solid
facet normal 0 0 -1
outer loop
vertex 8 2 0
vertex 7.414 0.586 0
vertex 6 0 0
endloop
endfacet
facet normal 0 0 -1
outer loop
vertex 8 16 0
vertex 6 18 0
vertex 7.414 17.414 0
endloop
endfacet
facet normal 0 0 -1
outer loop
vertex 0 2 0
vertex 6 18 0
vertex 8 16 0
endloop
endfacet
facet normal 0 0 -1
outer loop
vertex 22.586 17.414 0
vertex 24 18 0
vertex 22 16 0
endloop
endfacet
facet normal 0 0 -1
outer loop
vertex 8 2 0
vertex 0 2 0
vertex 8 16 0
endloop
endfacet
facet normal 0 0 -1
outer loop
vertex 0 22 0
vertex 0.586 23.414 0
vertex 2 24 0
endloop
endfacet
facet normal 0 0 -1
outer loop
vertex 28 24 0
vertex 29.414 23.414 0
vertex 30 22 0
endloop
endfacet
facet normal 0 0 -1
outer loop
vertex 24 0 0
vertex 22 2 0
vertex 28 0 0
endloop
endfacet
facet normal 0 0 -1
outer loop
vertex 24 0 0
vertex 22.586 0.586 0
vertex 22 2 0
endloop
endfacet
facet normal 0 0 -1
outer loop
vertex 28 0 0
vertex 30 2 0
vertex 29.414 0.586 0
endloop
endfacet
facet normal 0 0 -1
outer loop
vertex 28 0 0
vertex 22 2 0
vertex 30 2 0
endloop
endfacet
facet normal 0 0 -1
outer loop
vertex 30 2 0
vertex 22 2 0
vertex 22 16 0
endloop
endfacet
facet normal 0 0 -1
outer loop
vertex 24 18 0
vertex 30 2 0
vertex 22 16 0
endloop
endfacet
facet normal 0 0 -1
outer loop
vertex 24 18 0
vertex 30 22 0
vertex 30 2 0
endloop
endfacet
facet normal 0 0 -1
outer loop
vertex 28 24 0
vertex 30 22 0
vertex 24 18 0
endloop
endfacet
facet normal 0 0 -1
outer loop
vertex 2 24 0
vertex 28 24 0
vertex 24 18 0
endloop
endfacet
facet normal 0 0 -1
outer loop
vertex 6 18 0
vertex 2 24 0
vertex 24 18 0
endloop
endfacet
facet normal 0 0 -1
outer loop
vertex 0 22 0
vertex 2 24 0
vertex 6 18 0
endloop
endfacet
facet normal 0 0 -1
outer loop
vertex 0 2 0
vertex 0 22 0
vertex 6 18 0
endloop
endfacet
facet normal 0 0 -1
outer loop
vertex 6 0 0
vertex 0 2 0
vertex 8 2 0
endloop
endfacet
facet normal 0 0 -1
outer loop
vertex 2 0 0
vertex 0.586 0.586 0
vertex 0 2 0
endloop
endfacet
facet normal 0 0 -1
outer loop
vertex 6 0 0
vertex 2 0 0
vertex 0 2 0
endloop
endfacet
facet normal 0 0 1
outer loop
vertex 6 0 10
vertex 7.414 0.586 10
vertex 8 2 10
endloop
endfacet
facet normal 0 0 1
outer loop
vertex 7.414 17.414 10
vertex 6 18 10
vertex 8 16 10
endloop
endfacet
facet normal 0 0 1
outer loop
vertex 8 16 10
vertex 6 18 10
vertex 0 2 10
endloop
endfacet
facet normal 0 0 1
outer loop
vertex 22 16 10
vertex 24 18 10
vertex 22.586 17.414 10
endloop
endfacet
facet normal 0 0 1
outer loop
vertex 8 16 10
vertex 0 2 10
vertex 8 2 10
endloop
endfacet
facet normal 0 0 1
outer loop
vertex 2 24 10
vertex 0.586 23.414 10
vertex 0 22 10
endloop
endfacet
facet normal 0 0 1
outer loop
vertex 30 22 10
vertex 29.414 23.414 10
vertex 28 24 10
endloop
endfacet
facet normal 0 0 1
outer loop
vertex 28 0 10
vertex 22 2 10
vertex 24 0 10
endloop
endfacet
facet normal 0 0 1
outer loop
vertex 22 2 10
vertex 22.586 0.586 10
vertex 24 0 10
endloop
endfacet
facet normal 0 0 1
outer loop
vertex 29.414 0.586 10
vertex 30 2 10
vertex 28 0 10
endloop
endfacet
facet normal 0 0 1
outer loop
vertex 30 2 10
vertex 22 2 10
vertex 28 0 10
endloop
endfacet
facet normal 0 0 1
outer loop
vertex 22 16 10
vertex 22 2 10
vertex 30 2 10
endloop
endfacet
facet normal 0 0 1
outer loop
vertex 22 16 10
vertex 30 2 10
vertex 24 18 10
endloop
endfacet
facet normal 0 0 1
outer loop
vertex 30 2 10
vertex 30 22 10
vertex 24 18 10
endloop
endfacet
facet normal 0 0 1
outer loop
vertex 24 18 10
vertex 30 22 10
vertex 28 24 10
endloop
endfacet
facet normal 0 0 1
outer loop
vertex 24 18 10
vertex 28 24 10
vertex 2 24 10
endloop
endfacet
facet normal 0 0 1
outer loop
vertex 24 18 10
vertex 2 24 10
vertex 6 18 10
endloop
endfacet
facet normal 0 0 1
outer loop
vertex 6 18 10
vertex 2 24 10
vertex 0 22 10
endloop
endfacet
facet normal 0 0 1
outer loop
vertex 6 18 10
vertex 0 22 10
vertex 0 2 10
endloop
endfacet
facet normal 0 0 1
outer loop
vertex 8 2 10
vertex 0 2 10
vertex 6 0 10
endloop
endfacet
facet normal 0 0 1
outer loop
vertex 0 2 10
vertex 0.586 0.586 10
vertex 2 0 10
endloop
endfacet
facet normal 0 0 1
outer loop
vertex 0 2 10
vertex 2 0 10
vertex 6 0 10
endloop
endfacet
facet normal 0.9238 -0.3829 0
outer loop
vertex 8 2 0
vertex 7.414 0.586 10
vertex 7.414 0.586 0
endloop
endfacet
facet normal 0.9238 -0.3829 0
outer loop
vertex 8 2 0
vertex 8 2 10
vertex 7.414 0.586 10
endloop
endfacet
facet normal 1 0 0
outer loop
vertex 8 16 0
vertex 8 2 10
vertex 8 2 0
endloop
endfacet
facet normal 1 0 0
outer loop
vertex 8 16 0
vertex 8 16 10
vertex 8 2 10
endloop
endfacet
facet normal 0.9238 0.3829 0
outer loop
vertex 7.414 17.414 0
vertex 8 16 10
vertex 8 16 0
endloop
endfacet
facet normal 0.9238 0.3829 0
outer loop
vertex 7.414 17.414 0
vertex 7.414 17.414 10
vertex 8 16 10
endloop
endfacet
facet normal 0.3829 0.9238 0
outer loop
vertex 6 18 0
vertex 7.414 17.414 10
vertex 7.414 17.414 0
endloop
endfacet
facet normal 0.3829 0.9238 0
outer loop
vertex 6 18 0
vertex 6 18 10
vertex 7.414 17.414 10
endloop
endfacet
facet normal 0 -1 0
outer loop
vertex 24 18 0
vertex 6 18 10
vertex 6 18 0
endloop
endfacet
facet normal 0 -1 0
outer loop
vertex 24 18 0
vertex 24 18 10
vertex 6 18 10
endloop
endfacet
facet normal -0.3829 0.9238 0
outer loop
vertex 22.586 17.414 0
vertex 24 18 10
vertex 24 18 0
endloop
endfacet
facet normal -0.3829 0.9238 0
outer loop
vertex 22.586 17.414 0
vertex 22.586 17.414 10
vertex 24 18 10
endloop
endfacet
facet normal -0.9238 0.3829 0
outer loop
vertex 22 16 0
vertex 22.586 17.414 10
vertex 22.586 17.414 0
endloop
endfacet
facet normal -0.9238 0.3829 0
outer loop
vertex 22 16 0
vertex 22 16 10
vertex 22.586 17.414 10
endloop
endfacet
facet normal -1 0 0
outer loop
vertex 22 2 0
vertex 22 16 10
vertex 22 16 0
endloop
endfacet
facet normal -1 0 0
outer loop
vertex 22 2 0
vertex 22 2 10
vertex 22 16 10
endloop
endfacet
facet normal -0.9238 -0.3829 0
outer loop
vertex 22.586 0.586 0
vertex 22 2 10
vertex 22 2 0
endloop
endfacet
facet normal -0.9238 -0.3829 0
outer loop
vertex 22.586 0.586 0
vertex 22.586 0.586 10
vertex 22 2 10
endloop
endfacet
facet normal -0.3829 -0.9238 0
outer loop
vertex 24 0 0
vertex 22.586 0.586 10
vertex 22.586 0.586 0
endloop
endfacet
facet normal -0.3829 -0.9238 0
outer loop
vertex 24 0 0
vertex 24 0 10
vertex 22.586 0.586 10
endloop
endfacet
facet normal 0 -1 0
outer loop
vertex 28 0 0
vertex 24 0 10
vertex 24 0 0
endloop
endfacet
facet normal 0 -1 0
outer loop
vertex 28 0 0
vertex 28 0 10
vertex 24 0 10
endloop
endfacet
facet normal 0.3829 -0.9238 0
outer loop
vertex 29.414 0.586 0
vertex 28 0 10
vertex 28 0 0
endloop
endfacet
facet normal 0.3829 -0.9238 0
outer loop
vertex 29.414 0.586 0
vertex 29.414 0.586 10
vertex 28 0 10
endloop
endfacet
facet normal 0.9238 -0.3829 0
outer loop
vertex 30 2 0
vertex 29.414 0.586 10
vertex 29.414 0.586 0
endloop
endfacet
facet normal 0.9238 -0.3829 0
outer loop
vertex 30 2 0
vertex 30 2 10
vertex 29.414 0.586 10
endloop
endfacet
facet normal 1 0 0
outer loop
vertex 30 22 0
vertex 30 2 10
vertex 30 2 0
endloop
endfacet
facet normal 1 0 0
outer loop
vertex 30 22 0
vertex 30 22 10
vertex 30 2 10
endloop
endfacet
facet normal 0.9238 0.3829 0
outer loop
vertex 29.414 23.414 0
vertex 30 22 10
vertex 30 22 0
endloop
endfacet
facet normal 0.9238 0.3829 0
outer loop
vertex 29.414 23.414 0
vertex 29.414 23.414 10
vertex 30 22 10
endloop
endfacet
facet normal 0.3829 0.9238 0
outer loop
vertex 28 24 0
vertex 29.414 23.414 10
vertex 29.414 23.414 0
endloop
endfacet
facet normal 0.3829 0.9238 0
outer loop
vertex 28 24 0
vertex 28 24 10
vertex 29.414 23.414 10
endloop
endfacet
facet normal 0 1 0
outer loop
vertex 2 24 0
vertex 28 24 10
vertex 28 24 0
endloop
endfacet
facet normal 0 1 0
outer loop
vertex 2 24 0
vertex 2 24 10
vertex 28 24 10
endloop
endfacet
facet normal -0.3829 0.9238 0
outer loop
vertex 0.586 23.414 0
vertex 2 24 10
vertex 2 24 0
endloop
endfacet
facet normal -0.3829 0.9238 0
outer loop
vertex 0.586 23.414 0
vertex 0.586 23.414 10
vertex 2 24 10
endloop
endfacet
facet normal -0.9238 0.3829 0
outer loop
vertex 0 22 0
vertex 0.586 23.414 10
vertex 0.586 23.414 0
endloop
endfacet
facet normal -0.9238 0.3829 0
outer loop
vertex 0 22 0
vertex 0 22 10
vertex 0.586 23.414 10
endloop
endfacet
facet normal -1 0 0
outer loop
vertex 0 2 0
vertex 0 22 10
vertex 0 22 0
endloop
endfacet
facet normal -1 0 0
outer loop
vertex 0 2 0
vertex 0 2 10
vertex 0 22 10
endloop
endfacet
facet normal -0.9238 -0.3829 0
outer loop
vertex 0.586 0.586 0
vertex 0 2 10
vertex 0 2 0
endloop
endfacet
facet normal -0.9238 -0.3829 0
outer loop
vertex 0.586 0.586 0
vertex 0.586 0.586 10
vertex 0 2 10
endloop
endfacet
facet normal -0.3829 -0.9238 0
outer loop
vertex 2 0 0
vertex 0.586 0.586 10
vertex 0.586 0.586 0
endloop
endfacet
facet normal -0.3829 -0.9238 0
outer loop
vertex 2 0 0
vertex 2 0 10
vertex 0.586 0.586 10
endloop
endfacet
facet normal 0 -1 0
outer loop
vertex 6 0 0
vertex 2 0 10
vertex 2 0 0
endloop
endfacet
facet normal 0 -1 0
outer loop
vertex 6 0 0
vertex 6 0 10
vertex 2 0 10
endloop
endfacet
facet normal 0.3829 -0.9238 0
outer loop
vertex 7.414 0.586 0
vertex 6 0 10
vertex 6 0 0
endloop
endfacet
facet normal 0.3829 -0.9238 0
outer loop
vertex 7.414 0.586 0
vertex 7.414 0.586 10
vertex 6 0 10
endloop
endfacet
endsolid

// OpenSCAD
$fn = 32;

// ----------------------------------------------------------------------
// Clip blank: staple clip, 10 mm thick
// ----------------------------------------------------------------------

// --- parameters (mm) ---
profile_height = 10;      // extrusion height
profile_points = 24;      // points of the closed outline

profile = [[0, 2], [0.586, 0.586], [2, 0], [6, 0], [7.414, 0.586], [8, 2], [8, 16], [7.414, 17.414], [6, 18], [24, 18], [22.586, 17.414], [22, 16], [22, 2], [22.586, 0.586], [24, 0], [28, 0], [29.414, 0.586], [30, 2], [30, 22], [29.414, 23.414], [28, 24], [2, 24], [0.586, 23.414], [0, 22]];  // single closed polygon, 24 points, counter clockwise

// --- the one profile operation ---
linear_extrude(height = profile_height) polygon(points = profile);
